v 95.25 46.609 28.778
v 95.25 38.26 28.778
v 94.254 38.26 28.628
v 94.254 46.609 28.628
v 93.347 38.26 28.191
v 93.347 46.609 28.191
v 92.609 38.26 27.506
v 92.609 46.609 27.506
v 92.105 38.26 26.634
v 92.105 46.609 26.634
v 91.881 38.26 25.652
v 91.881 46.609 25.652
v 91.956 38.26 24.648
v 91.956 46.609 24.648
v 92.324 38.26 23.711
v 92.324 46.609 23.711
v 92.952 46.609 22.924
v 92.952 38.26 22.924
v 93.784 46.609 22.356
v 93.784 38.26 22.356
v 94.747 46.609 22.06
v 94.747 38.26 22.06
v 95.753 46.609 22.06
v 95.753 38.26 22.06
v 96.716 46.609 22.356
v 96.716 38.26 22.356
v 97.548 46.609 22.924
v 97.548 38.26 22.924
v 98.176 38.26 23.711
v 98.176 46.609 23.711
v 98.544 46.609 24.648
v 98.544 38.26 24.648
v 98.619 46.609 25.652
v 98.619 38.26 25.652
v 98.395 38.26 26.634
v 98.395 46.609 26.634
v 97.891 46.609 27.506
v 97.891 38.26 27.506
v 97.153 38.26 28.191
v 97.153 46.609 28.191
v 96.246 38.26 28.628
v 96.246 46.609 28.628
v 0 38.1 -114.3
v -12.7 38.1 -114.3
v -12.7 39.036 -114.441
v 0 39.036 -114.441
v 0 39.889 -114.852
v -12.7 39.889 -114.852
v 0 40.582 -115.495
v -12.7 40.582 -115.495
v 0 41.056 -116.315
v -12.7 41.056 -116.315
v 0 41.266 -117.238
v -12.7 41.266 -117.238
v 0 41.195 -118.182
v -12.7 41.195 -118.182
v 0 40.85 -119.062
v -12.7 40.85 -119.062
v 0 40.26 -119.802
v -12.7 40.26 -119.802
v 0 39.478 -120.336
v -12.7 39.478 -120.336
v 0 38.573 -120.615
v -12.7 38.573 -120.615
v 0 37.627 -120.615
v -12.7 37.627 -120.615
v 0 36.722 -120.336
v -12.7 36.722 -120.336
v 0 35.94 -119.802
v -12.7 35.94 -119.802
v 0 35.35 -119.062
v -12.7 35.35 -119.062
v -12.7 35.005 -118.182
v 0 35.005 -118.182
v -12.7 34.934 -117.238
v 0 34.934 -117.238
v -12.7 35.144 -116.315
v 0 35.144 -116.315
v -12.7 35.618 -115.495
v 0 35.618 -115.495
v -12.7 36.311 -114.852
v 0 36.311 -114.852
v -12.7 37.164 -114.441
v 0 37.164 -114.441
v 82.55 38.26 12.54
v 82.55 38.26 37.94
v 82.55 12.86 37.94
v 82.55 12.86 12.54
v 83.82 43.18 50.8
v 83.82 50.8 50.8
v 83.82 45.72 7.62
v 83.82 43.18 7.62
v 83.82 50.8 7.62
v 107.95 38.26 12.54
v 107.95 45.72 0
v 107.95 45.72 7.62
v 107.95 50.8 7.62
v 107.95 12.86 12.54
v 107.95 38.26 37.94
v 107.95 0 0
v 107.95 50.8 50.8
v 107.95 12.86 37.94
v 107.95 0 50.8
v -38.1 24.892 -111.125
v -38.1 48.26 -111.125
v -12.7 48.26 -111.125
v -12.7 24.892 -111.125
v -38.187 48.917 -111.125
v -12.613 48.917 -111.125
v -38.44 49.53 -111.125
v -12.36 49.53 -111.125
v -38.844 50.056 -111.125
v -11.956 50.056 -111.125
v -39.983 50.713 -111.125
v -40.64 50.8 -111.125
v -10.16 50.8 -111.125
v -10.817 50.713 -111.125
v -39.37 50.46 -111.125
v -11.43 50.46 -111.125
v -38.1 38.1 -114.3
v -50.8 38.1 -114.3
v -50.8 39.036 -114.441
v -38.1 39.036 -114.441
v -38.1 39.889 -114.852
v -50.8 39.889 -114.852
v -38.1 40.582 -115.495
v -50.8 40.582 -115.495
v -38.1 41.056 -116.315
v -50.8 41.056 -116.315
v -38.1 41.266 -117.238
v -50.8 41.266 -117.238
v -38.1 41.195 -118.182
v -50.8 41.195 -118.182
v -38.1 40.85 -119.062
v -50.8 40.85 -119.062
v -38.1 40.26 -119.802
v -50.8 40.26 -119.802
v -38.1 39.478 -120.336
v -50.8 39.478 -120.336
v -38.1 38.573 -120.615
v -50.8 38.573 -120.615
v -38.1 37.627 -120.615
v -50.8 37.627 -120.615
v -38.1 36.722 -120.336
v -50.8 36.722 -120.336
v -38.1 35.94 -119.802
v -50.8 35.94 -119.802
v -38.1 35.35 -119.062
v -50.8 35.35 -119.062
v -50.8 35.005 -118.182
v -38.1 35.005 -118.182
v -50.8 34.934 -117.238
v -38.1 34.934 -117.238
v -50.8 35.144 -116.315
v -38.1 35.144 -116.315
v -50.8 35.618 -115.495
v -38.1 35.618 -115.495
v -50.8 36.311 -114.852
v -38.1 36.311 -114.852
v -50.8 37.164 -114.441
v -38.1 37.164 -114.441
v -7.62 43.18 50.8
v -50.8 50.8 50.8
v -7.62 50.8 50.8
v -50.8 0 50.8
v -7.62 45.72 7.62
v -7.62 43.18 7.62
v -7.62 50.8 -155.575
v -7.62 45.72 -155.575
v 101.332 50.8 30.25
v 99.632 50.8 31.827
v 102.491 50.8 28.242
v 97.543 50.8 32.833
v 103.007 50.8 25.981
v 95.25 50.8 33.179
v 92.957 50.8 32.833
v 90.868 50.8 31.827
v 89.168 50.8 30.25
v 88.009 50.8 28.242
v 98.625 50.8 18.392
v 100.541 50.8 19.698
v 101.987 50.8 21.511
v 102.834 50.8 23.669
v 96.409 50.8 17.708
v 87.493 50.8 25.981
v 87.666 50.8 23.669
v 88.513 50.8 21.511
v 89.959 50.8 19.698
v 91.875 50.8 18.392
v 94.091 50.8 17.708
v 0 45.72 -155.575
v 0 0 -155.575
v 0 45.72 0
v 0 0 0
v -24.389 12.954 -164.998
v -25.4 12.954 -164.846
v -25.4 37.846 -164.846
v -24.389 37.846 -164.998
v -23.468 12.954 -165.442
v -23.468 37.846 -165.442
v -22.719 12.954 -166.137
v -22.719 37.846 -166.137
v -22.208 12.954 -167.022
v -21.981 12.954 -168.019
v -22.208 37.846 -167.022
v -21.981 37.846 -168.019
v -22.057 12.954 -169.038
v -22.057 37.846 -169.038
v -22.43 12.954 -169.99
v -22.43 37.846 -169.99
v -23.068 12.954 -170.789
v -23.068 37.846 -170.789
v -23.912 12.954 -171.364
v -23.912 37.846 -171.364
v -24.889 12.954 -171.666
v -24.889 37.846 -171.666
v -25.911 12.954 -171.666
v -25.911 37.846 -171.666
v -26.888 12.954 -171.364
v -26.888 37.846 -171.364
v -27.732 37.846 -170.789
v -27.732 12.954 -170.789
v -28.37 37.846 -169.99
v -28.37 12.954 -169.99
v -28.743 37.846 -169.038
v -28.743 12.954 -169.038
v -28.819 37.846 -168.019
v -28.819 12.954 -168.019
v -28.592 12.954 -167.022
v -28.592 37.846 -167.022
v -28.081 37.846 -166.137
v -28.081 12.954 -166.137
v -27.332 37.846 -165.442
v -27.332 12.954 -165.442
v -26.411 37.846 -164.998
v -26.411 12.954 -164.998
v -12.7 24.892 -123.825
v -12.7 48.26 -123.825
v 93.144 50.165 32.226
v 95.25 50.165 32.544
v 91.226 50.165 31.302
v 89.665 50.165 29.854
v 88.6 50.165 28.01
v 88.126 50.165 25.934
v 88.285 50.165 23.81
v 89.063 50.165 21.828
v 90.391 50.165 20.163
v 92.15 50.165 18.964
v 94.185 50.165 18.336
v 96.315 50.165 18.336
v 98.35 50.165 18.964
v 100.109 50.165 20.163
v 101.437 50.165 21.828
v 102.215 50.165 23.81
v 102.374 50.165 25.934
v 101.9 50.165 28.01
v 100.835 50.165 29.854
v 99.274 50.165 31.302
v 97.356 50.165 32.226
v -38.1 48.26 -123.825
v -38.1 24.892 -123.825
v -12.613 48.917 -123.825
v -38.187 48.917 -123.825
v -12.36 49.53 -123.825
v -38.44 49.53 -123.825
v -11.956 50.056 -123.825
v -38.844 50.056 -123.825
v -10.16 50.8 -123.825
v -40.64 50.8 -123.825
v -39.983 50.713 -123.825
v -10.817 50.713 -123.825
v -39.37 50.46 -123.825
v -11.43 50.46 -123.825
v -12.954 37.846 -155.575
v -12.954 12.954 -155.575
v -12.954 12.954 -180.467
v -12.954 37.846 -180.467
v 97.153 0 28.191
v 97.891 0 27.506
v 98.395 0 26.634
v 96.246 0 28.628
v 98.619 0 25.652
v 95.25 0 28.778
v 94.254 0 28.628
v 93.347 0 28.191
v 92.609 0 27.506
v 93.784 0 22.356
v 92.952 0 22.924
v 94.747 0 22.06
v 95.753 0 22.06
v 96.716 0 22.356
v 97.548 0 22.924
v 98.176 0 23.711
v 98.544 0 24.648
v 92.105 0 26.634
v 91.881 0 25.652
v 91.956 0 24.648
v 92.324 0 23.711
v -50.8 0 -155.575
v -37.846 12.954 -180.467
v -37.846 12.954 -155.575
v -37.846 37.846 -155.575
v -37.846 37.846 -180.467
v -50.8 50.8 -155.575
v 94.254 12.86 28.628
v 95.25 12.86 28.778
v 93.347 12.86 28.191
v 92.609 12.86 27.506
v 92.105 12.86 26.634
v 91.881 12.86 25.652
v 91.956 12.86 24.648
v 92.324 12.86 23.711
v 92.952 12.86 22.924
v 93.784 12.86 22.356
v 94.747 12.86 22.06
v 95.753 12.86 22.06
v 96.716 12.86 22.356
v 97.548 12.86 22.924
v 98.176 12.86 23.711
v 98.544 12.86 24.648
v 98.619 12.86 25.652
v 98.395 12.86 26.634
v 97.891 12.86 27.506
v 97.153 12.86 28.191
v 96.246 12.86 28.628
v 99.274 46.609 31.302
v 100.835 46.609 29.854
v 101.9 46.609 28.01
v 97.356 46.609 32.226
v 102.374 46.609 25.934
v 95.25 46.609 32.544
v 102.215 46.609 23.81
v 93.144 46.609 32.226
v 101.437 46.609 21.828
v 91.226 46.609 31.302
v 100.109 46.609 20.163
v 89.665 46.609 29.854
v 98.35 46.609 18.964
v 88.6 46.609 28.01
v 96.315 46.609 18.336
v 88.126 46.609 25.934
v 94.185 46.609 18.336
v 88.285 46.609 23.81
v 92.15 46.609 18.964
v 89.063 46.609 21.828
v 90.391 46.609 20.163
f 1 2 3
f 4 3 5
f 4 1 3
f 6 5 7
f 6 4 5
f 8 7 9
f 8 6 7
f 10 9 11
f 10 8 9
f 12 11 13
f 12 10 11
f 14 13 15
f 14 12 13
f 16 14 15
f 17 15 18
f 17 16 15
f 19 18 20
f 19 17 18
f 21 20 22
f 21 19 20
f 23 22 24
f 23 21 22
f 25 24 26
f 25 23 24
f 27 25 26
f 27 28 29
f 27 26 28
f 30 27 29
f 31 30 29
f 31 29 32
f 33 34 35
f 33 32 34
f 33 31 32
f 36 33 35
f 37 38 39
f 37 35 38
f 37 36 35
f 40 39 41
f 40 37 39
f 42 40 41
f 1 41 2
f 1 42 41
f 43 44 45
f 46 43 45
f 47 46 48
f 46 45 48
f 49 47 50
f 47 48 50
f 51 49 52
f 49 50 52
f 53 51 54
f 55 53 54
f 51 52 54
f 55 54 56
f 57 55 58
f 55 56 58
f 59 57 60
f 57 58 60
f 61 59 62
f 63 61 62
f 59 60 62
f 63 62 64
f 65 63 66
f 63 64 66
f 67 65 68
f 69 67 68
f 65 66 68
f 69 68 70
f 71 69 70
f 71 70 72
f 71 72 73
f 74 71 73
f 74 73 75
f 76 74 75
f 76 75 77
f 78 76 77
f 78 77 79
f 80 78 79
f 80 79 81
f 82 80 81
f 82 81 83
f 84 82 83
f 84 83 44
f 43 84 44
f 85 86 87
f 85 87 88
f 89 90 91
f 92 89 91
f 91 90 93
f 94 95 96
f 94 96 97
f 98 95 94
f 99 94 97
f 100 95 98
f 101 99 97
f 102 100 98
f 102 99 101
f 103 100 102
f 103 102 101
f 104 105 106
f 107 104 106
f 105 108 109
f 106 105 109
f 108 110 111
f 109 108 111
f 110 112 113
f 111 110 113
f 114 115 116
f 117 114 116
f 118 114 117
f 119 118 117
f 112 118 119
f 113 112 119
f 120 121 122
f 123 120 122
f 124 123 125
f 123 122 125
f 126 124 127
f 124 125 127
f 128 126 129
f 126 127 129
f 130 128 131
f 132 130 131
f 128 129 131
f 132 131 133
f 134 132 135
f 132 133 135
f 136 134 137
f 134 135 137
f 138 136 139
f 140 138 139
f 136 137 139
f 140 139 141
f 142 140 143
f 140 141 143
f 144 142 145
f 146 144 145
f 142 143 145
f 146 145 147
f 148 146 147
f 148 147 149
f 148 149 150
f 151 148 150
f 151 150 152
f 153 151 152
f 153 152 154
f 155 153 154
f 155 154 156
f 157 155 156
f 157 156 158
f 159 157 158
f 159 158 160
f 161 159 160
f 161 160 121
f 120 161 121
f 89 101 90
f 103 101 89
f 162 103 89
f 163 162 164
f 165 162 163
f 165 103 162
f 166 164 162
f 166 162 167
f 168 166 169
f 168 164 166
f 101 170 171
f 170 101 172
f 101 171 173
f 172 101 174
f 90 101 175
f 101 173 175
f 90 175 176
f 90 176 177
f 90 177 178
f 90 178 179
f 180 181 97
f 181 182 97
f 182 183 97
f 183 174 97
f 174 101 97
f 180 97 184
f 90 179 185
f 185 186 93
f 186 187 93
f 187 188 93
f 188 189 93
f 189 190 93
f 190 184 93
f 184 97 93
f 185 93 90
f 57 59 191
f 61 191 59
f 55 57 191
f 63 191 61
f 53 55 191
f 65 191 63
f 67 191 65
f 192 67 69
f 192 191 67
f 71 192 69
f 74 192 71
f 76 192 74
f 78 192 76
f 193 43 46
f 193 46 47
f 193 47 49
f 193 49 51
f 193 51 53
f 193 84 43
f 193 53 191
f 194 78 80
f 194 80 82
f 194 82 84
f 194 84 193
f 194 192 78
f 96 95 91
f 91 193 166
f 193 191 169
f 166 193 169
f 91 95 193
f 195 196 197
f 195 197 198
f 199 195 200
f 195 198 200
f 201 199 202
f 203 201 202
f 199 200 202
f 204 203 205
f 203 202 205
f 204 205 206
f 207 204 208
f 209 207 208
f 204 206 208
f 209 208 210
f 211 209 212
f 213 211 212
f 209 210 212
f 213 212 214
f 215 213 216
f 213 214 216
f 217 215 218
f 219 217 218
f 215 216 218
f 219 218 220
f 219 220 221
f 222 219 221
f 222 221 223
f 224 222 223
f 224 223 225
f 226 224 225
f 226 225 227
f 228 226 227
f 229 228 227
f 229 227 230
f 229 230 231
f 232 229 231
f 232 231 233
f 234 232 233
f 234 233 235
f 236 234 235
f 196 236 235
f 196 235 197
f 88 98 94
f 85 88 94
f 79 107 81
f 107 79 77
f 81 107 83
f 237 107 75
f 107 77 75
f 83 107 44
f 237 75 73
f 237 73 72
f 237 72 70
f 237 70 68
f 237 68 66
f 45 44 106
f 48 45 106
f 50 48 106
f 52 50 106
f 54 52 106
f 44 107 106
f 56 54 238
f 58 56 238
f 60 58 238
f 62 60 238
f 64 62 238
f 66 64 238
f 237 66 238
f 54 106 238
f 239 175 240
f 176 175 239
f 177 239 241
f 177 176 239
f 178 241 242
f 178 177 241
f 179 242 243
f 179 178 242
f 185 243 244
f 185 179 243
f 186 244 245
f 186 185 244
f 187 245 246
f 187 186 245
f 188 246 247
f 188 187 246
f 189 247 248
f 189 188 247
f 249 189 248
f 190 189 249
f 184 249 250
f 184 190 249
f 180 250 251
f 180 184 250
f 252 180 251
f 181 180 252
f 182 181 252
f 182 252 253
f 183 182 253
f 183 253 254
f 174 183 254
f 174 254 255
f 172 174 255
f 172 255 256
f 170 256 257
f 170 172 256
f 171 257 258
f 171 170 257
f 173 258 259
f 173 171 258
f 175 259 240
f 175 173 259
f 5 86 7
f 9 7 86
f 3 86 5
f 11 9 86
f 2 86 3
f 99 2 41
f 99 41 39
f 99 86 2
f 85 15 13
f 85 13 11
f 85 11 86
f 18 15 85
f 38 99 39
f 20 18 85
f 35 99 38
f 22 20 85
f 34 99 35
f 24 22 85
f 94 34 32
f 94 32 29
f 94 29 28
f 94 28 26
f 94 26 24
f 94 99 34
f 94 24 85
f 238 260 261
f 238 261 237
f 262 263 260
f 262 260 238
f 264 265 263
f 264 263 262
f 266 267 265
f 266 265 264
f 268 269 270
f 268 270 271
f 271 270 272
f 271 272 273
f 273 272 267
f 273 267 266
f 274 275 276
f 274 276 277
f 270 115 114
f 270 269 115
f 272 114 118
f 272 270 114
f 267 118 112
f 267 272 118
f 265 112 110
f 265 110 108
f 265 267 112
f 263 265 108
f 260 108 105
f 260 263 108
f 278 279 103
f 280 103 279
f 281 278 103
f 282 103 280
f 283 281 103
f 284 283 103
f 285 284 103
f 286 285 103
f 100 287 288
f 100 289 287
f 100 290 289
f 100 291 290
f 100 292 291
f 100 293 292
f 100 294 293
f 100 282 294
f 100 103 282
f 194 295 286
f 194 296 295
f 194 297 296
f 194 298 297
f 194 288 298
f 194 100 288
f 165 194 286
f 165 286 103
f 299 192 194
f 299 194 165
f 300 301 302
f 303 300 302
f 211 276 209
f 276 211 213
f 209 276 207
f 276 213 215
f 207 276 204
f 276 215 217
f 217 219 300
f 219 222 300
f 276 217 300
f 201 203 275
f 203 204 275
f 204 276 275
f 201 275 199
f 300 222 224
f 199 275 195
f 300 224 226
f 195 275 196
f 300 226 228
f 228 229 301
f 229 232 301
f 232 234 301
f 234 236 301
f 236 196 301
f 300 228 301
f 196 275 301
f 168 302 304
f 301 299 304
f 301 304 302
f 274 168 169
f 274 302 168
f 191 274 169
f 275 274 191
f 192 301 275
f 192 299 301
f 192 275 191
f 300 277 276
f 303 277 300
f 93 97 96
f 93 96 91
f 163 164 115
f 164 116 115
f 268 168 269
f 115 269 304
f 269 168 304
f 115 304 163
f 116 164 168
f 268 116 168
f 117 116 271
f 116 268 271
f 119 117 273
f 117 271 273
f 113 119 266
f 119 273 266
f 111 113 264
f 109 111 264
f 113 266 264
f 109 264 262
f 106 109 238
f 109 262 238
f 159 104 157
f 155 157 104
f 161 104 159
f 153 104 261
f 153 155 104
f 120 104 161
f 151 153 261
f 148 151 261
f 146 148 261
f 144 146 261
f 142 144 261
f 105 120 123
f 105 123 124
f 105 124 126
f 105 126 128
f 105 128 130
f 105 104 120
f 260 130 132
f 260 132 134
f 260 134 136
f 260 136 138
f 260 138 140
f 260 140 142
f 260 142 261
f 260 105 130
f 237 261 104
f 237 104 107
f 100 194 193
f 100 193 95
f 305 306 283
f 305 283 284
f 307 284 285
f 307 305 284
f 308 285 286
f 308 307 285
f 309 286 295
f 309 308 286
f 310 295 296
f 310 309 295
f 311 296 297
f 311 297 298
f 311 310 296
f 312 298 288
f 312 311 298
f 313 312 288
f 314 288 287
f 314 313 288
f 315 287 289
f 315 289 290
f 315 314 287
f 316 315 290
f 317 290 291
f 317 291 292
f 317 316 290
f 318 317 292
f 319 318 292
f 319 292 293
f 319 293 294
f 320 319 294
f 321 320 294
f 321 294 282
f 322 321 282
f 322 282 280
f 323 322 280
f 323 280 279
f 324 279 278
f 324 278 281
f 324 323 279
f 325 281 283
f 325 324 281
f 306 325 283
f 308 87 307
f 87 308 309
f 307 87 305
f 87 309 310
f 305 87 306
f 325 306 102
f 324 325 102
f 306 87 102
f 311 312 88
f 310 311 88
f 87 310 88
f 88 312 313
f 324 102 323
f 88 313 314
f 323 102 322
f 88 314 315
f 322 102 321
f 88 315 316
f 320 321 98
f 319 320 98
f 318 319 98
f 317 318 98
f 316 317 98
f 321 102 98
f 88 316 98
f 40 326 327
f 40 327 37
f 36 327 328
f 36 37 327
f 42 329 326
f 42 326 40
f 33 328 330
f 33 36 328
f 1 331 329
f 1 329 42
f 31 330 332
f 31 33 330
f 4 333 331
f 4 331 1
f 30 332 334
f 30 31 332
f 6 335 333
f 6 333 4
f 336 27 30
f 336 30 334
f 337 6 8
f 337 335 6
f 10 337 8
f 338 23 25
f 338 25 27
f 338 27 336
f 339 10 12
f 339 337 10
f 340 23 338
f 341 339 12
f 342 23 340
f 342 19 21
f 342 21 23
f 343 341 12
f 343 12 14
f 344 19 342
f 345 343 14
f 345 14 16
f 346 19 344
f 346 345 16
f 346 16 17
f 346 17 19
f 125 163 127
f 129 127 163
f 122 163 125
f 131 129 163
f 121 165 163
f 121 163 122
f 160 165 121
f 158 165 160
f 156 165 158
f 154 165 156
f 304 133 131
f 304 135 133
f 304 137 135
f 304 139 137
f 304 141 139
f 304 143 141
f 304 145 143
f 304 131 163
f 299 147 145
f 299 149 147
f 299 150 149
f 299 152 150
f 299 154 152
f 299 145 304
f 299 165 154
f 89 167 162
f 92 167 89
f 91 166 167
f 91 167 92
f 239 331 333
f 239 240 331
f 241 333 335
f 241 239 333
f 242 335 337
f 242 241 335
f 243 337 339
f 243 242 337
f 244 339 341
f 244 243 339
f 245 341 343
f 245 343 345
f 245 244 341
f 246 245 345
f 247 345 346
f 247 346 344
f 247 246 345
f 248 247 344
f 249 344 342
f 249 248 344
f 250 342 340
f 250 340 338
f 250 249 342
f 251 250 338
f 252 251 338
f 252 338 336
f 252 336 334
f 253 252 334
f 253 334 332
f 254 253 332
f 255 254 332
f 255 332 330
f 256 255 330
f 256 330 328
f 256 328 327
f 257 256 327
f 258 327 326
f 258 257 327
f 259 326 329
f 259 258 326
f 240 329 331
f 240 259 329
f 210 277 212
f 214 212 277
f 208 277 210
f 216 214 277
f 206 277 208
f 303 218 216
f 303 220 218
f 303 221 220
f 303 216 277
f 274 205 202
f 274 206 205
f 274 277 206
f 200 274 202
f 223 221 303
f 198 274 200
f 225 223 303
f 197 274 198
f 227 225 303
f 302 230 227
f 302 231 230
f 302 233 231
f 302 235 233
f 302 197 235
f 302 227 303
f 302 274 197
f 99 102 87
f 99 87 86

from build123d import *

# Parameters (mm, degrees)
BOSS_EXTRUDE1_DEPTH = 50.8
SKETCH3_W           = 25.4
SKETCH3_H           = 25.4
CUT_EXTRUDE1_DEPTH  = 25.4
SKETCH8_W           = 24.892
SKETCH8_H           = 24.892
BOSS_EXTRUDE2_DEPTH = 24.892
SKETCH12_R          = 3.429
CUT_EXTRUDE2_DEPTH  = 25.4
SKETCH13_W          = 25.4
SKETCH13_H          = 12.7
CUT_EXTRUDE3_DEPTH  = 25.908
FILLET1_R           = 2.54
SKETCH14_R          = 3.175
CUT_EXTRUDE5_DEPTH  = 246.663470197
CUT_EXTRUDE6_DEPTH  = 5.08
SKETCH18_W          = 91.44
SKETCH18_H          = 43.18
CUT_EXTRUDE7_DEPTH  = 7.62


with BuildPart() as part:
    # Sketch2 → Boss-Extrude1 (new body)
    with BuildSketch(Plane(origin=(0, 0, 0), x_dir=(1, 0, 0), z_dir=(0, 1, 0))):
        Polygon((-50.8, 155.575), (0, 155.575), (0, 0), (107.95, 0), (107.95, -50.8), (-50.8, -50.8), align=None)
    extrude(amount=BOSS_EXTRUDE1_DEPTH)

    # Sketch3 → Cut-Extrude1 (cut)
    with BuildSketch(Plane(origin=(107.95, 0, 0), x_dir=(0, 0, -1), z_dir=(1, 0, 0))):
        with Locations((-25.239912, 25.560088)):
            Rectangle(SKETCH3_W, SKETCH3_H)
    extrude(amount=-CUT_EXTRUDE1_DEPTH, mode=Mode.SUBTRACT)

    # Sketch7 → CBORE for 1/4 Binding Head Machine Screw1 (revolve, cut)
    with BuildSketch(Plane(origin=(95.25, 50.8, 25.4), x_dir=(0, 0, 1), z_dir=(1, 0, 0))):
        Polygon((0, 0), (0, 50.8), (3.3782, 50.8), (3.3782, 4.191), (7.14375, 4.191), (7.14375, 0.635), (7.77875, 0), align=None)
    revolve(axis=Axis((95.25, 57.15, 25.4), (0, -1, 0)), mode=Mode.SUBTRACT)

    # Sketch8 → Boss-Extrude2 (add)
    with BuildSketch(Plane(origin=(0, 0, -155.575), x_dir=(-1, 0, 0), z_dir=(0, 0, -1))):
        with Locations((25.4, 25.4)):
            Rectangle(SKETCH8_W, SKETCH8_H)
    extrude(amount=BOSS_EXTRUDE2_DEPTH)

    # Sketch12 → Cut-Extrude2 (cut)
    with BuildSketch(Plane(origin=(0, 37.846, 0), x_dir=(1, 0, 0), z_dir=(0, 1, 0))):
        with Locations(Location((-25.4, 168.275, 0), (0, 0, 270))):
            Circle(SKETCH12_R)
    extrude(amount=-CUT_EXTRUDE2_DEPTH, mode=Mode.SUBTRACT)

    # Sketch13 → Cut-Extrude3 (cut)
    with BuildSketch(Plane(origin=(0, 50.8, 0), x_dir=(1, 0, 0), z_dir=(0, 1, 0))):
        with Locations((-25.4, 117.475)):
            Rectangle(SKETCH13_W, SKETCH13_H)
    extrude(amount=-CUT_EXTRUDE3_DEPTH, mode=Mode.SUBTRACT)

    # Fillet1
    fillet1_edges = [part.edges().sort_by_distance(p)[0] for p in [
        (-38.1, 50.8, -117.475),
        (-12.7, 50.8, -117.475),
    ]]
    fillet(fillet1_edges, radius=FILLET1_R)

    # Sketch14 → Cut-Extrude5 (cut, through all)
    with BuildSketch(Plane.ZY.offset(50.8)):
        with Locations((-117.475, 38.1)):
            Circle(SKETCH14_R)
    extrude(amount=-CUT_EXTRUDE5_DEPTH, mode=Mode.SUBTRACT)

    # Sketch17 → Cut-Extrude6 (cut)
    with BuildSketch(Plane(origin=(0, 50.8, 0), x_dir=(1, 0, 0), z_dir=(0, 1, 0))):
        Polygon((0, 155.575), (0, 0), (107.95, 0), (107.95, -7.62), (-7.62, -7.62), (-7.62, 155.575), align=None)
    extrude(amount=-CUT_EXTRUDE6_DEPTH, mode=Mode.SUBTRACT)

    # Sketch18 → Cut-Extrude7 (cut)
    with BuildSketch(Plane(origin=(0, 50.8, 0), x_dir=(1, 0, 0), z_dir=(0, 1, 0))):
        with Locations((38.1, -29.21)):
            Rectangle(SKETCH18_W, SKETCH18_H)
    extrude(amount=-CUT_EXTRUDE7_DEPTH, mode=Mode.SUBTRACT)


solid = part.part
